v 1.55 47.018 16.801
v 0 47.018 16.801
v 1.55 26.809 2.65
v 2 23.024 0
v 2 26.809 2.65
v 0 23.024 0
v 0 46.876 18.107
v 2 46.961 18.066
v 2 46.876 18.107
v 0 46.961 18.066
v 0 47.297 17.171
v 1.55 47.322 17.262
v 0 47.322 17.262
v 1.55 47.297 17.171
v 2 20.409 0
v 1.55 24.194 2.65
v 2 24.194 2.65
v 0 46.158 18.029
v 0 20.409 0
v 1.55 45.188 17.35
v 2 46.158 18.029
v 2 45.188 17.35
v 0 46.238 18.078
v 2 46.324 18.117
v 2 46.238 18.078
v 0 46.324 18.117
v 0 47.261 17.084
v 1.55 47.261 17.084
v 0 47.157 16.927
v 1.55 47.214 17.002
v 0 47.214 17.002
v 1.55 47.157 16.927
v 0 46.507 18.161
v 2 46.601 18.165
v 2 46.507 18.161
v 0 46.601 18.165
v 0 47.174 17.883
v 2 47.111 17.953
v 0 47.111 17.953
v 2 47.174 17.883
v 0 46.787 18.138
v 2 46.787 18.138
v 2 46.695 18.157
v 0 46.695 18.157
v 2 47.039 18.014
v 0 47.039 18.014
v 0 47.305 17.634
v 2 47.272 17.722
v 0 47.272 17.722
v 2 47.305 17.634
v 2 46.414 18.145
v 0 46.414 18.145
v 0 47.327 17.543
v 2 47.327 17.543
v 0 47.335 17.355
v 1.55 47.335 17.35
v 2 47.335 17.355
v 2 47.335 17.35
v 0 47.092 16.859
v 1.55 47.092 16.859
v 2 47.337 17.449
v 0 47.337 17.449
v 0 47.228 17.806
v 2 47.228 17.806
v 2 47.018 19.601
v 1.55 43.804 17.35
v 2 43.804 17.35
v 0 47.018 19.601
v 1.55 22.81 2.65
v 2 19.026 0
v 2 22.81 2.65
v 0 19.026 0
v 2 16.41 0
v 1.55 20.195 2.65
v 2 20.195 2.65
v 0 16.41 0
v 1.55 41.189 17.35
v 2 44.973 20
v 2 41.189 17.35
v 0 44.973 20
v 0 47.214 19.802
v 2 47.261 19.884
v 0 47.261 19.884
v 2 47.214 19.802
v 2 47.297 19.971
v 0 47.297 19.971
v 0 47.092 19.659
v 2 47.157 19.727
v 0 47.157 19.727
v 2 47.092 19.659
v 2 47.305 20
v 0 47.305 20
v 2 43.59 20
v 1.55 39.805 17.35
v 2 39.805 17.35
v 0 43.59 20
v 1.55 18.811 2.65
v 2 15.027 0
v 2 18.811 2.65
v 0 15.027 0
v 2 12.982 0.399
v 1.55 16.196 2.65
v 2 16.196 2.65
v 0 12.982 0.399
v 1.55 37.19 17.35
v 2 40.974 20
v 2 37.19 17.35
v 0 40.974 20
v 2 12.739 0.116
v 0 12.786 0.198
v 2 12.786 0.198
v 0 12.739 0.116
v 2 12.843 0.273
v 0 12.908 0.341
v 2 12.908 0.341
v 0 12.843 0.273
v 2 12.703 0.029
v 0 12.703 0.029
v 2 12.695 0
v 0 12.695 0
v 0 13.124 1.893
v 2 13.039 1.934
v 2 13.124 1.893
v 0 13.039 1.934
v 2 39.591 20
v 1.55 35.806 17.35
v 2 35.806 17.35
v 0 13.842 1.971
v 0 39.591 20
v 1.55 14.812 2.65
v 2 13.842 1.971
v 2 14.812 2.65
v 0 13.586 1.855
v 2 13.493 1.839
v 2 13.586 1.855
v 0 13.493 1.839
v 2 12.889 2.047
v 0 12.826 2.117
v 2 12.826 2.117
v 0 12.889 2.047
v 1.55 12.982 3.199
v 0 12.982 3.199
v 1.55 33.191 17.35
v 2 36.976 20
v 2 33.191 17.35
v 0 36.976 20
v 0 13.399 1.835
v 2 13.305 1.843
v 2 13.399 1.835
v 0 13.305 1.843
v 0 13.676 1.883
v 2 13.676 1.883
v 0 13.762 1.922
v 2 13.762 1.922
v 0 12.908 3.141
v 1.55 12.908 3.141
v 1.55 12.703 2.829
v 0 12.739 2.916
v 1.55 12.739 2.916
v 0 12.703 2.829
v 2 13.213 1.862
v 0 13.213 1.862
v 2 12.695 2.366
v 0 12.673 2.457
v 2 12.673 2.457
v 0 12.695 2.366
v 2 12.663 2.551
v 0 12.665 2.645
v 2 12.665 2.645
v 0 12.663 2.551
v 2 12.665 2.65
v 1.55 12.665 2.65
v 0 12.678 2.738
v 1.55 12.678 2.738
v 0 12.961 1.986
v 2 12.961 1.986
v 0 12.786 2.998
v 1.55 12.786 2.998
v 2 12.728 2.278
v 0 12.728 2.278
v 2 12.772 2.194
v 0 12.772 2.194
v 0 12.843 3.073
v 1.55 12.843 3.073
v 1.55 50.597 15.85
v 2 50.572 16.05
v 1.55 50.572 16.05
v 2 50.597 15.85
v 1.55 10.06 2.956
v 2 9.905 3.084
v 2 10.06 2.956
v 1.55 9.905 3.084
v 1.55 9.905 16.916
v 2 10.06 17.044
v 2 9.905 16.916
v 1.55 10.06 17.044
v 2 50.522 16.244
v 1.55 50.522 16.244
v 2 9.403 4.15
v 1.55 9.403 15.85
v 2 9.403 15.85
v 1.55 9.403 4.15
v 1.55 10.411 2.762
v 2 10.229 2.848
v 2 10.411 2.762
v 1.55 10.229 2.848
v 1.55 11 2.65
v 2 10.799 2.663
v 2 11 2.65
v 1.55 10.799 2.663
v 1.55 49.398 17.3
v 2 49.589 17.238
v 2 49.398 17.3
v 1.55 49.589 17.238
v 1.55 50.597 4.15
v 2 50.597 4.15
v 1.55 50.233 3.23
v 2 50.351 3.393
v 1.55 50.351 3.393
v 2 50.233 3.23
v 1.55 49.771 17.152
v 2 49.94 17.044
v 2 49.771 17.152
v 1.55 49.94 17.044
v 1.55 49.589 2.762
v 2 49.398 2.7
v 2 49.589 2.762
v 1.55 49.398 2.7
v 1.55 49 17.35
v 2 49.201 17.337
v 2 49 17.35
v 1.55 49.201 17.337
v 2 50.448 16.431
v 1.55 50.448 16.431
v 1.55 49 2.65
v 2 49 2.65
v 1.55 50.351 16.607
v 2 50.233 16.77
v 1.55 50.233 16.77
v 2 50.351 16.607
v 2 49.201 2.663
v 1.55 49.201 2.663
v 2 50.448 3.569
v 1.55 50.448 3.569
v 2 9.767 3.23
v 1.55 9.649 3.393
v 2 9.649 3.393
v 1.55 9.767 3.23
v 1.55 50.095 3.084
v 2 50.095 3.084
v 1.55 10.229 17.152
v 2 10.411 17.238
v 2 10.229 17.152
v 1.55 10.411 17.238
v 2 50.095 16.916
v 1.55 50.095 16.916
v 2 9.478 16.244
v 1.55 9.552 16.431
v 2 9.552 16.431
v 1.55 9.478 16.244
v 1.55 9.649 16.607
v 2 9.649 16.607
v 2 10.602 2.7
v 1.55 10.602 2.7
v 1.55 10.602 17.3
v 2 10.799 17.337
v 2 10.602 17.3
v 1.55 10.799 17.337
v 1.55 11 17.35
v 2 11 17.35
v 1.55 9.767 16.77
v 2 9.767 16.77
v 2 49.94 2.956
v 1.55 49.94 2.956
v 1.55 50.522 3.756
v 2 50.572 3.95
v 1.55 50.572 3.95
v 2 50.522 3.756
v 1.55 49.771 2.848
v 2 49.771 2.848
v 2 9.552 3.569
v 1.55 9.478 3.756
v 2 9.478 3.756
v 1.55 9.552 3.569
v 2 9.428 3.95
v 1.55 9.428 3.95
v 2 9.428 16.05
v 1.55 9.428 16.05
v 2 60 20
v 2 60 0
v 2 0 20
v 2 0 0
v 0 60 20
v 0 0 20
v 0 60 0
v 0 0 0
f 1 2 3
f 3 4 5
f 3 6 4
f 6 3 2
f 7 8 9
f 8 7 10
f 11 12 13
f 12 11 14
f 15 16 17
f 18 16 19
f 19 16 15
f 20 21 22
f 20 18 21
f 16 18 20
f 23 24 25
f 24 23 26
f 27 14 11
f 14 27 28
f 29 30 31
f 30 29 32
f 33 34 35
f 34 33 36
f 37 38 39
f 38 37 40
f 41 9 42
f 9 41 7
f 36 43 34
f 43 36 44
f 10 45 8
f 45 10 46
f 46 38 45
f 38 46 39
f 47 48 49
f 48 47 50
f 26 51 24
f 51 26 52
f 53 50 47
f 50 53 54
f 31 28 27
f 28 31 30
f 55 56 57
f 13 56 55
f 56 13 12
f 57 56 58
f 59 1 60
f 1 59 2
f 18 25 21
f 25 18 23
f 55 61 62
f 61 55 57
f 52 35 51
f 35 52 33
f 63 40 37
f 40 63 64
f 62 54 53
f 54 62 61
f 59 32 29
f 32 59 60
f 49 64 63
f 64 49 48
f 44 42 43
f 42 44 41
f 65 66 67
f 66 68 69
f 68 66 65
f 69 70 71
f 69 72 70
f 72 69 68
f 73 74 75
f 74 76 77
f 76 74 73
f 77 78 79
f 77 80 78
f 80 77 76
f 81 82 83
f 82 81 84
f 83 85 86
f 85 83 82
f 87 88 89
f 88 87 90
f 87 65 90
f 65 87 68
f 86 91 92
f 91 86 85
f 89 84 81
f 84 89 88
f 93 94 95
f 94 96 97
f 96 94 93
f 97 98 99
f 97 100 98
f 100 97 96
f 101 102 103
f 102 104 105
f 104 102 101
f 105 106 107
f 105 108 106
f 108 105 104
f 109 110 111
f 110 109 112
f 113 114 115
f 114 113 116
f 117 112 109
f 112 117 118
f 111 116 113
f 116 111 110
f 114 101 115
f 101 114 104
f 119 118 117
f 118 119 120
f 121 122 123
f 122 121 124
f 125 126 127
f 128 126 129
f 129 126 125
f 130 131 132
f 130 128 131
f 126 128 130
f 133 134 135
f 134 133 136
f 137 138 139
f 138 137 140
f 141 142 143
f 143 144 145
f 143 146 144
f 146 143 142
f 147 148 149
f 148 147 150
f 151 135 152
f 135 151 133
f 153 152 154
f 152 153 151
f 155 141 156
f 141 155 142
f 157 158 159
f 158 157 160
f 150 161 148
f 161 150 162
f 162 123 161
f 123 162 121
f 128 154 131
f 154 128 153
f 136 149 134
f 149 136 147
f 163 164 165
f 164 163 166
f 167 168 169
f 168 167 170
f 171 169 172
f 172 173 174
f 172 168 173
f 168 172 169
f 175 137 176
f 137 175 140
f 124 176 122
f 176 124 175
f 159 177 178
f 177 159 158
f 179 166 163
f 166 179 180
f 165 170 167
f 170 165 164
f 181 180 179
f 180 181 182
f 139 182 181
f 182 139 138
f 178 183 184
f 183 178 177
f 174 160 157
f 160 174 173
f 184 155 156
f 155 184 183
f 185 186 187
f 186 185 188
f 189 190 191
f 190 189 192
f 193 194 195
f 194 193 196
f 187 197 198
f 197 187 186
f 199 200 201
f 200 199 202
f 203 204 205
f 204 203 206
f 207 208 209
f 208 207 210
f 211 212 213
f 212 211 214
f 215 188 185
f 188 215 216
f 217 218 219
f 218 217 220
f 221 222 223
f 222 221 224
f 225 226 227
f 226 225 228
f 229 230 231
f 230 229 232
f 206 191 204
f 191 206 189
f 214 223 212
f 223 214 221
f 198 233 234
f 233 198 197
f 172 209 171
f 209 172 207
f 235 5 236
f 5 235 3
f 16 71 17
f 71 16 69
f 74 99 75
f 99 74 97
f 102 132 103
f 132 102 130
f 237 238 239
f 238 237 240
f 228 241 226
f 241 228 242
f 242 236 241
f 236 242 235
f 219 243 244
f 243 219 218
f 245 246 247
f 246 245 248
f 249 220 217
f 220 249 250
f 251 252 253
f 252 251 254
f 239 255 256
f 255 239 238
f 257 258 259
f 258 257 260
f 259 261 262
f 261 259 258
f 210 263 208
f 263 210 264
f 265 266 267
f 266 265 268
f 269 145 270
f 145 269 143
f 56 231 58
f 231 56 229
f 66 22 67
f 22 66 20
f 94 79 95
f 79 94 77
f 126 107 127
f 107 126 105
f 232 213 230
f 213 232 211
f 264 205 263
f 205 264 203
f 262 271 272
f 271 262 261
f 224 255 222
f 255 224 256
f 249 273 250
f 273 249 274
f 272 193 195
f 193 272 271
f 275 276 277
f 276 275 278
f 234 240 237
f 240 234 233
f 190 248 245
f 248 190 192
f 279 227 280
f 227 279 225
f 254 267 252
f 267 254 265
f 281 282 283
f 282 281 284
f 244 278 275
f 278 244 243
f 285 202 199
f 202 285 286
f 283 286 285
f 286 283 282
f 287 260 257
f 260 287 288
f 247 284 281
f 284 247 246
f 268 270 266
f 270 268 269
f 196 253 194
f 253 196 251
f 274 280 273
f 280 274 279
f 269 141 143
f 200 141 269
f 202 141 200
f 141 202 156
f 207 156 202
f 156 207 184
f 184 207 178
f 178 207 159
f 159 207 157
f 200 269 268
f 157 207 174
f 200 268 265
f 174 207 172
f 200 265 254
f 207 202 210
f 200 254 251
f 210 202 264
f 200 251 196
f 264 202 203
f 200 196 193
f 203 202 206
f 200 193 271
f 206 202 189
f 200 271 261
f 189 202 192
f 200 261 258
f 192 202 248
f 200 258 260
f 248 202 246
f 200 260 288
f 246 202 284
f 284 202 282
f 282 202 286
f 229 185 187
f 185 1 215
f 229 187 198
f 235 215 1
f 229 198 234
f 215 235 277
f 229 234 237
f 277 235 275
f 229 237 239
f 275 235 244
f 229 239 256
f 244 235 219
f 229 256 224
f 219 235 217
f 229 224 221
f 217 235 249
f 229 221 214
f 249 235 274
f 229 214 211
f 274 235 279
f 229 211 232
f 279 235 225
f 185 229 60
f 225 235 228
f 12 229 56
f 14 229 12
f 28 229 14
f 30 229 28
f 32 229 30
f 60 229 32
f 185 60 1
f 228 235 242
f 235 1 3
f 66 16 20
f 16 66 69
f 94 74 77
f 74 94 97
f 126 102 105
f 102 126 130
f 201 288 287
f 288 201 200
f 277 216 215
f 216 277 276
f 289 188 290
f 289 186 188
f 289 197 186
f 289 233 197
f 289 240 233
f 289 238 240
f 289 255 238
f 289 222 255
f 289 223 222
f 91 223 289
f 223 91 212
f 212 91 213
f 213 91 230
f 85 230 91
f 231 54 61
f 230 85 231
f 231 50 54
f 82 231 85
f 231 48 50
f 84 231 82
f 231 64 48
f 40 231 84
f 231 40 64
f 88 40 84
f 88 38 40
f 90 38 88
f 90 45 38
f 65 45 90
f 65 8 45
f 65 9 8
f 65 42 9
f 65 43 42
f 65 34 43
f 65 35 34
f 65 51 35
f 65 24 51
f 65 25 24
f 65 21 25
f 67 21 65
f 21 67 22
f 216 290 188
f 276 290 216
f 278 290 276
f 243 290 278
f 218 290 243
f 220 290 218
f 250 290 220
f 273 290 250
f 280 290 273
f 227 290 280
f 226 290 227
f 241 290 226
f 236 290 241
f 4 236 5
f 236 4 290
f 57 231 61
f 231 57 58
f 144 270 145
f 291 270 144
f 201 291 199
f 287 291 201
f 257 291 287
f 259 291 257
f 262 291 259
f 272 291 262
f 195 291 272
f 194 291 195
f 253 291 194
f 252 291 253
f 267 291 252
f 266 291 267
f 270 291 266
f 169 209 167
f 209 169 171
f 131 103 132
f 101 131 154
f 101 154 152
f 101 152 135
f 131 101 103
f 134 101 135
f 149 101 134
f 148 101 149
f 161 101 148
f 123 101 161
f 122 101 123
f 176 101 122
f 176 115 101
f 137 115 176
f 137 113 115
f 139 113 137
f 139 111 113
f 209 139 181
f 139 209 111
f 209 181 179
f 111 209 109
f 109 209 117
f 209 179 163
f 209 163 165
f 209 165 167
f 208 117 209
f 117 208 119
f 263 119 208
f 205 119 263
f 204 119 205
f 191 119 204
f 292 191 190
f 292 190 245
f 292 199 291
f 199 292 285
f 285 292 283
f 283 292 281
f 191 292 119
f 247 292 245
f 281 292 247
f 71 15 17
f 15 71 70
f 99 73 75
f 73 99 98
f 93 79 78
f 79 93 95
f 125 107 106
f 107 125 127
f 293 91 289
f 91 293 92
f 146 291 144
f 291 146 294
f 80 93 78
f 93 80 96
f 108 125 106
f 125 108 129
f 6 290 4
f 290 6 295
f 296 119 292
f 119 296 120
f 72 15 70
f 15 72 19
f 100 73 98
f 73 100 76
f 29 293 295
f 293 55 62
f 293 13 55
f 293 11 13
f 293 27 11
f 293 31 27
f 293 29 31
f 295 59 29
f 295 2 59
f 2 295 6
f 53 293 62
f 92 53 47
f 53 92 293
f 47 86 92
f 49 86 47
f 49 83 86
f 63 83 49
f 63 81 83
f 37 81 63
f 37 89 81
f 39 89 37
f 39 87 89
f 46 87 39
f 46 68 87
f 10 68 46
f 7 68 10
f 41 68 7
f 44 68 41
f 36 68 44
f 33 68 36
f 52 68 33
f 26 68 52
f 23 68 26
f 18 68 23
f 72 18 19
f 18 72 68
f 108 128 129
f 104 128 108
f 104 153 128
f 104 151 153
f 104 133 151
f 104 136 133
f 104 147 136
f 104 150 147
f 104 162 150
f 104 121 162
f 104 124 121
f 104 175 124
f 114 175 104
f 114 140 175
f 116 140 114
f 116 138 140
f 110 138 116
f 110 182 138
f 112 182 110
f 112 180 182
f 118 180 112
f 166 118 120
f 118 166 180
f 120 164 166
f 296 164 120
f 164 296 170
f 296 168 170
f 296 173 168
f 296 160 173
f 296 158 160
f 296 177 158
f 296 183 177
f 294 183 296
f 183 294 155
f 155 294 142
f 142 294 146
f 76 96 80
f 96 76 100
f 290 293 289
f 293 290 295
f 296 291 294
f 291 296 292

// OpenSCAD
$fn = 50;

wall_t = 2.0;

// 1. ARCHITECTURAL LOUVERED SIDE VENT MODULE
// length: horizontal length (Y axis)
// height: total height of the grille (Z axis)
// num_slots: number of angled slats
module louvered_side_grille(length=42.0, num_slots=4, slot_h=1.4, pitch=2.6, angle=40) {
    total_h = (num_slots - 1) * pitch + slot_h;
    
    // Outer recessed bevel frame (0.8mm depth into the outer wall)
    translate([0, 0, 0])
        rotate([0, 90, 0])
        hull() {
            for (dy = [-length/2 + 2.0, length/2 - 2.0]) {
                for (dz = [-total_h/2 - 0.8, total_h/2 + 0.8]) {
                    translate([dz, dy, 0]) cylinder(r=1.6, h=0.9, center=true);
                }
            }
        }
    
    // Angled louver slats cutting through the wall
    // Sloping down towards outside (-X) so you cannot see straight in
    for (i = [0 : num_slots - 1]) {
        z_offset = -total_h/2 + slot_h/2 + i * pitch;
        translate([0, 0, z_offset])
            rotate([angle, 0, 0]) // incline across wall
            rotate([0, 90, 0])
            hull() {
                translate([0, -length/2 + slot_h/2]) cylinder(d=slot_h, h=10, center=true);
                translate([0,  length/2 - slot_h/2]) cylinder(d=slot_h, h=10, center=true);
            }
    }
}

// Render test slab with the grille
difference() {
    cube([wall_t, 60, 20]);
    translate([wall_t, 30, 10])
        louvered_side_grille(length=42.0, num_slots=4, slot_h=1.5, pitch=2.8, angle=35);
}
